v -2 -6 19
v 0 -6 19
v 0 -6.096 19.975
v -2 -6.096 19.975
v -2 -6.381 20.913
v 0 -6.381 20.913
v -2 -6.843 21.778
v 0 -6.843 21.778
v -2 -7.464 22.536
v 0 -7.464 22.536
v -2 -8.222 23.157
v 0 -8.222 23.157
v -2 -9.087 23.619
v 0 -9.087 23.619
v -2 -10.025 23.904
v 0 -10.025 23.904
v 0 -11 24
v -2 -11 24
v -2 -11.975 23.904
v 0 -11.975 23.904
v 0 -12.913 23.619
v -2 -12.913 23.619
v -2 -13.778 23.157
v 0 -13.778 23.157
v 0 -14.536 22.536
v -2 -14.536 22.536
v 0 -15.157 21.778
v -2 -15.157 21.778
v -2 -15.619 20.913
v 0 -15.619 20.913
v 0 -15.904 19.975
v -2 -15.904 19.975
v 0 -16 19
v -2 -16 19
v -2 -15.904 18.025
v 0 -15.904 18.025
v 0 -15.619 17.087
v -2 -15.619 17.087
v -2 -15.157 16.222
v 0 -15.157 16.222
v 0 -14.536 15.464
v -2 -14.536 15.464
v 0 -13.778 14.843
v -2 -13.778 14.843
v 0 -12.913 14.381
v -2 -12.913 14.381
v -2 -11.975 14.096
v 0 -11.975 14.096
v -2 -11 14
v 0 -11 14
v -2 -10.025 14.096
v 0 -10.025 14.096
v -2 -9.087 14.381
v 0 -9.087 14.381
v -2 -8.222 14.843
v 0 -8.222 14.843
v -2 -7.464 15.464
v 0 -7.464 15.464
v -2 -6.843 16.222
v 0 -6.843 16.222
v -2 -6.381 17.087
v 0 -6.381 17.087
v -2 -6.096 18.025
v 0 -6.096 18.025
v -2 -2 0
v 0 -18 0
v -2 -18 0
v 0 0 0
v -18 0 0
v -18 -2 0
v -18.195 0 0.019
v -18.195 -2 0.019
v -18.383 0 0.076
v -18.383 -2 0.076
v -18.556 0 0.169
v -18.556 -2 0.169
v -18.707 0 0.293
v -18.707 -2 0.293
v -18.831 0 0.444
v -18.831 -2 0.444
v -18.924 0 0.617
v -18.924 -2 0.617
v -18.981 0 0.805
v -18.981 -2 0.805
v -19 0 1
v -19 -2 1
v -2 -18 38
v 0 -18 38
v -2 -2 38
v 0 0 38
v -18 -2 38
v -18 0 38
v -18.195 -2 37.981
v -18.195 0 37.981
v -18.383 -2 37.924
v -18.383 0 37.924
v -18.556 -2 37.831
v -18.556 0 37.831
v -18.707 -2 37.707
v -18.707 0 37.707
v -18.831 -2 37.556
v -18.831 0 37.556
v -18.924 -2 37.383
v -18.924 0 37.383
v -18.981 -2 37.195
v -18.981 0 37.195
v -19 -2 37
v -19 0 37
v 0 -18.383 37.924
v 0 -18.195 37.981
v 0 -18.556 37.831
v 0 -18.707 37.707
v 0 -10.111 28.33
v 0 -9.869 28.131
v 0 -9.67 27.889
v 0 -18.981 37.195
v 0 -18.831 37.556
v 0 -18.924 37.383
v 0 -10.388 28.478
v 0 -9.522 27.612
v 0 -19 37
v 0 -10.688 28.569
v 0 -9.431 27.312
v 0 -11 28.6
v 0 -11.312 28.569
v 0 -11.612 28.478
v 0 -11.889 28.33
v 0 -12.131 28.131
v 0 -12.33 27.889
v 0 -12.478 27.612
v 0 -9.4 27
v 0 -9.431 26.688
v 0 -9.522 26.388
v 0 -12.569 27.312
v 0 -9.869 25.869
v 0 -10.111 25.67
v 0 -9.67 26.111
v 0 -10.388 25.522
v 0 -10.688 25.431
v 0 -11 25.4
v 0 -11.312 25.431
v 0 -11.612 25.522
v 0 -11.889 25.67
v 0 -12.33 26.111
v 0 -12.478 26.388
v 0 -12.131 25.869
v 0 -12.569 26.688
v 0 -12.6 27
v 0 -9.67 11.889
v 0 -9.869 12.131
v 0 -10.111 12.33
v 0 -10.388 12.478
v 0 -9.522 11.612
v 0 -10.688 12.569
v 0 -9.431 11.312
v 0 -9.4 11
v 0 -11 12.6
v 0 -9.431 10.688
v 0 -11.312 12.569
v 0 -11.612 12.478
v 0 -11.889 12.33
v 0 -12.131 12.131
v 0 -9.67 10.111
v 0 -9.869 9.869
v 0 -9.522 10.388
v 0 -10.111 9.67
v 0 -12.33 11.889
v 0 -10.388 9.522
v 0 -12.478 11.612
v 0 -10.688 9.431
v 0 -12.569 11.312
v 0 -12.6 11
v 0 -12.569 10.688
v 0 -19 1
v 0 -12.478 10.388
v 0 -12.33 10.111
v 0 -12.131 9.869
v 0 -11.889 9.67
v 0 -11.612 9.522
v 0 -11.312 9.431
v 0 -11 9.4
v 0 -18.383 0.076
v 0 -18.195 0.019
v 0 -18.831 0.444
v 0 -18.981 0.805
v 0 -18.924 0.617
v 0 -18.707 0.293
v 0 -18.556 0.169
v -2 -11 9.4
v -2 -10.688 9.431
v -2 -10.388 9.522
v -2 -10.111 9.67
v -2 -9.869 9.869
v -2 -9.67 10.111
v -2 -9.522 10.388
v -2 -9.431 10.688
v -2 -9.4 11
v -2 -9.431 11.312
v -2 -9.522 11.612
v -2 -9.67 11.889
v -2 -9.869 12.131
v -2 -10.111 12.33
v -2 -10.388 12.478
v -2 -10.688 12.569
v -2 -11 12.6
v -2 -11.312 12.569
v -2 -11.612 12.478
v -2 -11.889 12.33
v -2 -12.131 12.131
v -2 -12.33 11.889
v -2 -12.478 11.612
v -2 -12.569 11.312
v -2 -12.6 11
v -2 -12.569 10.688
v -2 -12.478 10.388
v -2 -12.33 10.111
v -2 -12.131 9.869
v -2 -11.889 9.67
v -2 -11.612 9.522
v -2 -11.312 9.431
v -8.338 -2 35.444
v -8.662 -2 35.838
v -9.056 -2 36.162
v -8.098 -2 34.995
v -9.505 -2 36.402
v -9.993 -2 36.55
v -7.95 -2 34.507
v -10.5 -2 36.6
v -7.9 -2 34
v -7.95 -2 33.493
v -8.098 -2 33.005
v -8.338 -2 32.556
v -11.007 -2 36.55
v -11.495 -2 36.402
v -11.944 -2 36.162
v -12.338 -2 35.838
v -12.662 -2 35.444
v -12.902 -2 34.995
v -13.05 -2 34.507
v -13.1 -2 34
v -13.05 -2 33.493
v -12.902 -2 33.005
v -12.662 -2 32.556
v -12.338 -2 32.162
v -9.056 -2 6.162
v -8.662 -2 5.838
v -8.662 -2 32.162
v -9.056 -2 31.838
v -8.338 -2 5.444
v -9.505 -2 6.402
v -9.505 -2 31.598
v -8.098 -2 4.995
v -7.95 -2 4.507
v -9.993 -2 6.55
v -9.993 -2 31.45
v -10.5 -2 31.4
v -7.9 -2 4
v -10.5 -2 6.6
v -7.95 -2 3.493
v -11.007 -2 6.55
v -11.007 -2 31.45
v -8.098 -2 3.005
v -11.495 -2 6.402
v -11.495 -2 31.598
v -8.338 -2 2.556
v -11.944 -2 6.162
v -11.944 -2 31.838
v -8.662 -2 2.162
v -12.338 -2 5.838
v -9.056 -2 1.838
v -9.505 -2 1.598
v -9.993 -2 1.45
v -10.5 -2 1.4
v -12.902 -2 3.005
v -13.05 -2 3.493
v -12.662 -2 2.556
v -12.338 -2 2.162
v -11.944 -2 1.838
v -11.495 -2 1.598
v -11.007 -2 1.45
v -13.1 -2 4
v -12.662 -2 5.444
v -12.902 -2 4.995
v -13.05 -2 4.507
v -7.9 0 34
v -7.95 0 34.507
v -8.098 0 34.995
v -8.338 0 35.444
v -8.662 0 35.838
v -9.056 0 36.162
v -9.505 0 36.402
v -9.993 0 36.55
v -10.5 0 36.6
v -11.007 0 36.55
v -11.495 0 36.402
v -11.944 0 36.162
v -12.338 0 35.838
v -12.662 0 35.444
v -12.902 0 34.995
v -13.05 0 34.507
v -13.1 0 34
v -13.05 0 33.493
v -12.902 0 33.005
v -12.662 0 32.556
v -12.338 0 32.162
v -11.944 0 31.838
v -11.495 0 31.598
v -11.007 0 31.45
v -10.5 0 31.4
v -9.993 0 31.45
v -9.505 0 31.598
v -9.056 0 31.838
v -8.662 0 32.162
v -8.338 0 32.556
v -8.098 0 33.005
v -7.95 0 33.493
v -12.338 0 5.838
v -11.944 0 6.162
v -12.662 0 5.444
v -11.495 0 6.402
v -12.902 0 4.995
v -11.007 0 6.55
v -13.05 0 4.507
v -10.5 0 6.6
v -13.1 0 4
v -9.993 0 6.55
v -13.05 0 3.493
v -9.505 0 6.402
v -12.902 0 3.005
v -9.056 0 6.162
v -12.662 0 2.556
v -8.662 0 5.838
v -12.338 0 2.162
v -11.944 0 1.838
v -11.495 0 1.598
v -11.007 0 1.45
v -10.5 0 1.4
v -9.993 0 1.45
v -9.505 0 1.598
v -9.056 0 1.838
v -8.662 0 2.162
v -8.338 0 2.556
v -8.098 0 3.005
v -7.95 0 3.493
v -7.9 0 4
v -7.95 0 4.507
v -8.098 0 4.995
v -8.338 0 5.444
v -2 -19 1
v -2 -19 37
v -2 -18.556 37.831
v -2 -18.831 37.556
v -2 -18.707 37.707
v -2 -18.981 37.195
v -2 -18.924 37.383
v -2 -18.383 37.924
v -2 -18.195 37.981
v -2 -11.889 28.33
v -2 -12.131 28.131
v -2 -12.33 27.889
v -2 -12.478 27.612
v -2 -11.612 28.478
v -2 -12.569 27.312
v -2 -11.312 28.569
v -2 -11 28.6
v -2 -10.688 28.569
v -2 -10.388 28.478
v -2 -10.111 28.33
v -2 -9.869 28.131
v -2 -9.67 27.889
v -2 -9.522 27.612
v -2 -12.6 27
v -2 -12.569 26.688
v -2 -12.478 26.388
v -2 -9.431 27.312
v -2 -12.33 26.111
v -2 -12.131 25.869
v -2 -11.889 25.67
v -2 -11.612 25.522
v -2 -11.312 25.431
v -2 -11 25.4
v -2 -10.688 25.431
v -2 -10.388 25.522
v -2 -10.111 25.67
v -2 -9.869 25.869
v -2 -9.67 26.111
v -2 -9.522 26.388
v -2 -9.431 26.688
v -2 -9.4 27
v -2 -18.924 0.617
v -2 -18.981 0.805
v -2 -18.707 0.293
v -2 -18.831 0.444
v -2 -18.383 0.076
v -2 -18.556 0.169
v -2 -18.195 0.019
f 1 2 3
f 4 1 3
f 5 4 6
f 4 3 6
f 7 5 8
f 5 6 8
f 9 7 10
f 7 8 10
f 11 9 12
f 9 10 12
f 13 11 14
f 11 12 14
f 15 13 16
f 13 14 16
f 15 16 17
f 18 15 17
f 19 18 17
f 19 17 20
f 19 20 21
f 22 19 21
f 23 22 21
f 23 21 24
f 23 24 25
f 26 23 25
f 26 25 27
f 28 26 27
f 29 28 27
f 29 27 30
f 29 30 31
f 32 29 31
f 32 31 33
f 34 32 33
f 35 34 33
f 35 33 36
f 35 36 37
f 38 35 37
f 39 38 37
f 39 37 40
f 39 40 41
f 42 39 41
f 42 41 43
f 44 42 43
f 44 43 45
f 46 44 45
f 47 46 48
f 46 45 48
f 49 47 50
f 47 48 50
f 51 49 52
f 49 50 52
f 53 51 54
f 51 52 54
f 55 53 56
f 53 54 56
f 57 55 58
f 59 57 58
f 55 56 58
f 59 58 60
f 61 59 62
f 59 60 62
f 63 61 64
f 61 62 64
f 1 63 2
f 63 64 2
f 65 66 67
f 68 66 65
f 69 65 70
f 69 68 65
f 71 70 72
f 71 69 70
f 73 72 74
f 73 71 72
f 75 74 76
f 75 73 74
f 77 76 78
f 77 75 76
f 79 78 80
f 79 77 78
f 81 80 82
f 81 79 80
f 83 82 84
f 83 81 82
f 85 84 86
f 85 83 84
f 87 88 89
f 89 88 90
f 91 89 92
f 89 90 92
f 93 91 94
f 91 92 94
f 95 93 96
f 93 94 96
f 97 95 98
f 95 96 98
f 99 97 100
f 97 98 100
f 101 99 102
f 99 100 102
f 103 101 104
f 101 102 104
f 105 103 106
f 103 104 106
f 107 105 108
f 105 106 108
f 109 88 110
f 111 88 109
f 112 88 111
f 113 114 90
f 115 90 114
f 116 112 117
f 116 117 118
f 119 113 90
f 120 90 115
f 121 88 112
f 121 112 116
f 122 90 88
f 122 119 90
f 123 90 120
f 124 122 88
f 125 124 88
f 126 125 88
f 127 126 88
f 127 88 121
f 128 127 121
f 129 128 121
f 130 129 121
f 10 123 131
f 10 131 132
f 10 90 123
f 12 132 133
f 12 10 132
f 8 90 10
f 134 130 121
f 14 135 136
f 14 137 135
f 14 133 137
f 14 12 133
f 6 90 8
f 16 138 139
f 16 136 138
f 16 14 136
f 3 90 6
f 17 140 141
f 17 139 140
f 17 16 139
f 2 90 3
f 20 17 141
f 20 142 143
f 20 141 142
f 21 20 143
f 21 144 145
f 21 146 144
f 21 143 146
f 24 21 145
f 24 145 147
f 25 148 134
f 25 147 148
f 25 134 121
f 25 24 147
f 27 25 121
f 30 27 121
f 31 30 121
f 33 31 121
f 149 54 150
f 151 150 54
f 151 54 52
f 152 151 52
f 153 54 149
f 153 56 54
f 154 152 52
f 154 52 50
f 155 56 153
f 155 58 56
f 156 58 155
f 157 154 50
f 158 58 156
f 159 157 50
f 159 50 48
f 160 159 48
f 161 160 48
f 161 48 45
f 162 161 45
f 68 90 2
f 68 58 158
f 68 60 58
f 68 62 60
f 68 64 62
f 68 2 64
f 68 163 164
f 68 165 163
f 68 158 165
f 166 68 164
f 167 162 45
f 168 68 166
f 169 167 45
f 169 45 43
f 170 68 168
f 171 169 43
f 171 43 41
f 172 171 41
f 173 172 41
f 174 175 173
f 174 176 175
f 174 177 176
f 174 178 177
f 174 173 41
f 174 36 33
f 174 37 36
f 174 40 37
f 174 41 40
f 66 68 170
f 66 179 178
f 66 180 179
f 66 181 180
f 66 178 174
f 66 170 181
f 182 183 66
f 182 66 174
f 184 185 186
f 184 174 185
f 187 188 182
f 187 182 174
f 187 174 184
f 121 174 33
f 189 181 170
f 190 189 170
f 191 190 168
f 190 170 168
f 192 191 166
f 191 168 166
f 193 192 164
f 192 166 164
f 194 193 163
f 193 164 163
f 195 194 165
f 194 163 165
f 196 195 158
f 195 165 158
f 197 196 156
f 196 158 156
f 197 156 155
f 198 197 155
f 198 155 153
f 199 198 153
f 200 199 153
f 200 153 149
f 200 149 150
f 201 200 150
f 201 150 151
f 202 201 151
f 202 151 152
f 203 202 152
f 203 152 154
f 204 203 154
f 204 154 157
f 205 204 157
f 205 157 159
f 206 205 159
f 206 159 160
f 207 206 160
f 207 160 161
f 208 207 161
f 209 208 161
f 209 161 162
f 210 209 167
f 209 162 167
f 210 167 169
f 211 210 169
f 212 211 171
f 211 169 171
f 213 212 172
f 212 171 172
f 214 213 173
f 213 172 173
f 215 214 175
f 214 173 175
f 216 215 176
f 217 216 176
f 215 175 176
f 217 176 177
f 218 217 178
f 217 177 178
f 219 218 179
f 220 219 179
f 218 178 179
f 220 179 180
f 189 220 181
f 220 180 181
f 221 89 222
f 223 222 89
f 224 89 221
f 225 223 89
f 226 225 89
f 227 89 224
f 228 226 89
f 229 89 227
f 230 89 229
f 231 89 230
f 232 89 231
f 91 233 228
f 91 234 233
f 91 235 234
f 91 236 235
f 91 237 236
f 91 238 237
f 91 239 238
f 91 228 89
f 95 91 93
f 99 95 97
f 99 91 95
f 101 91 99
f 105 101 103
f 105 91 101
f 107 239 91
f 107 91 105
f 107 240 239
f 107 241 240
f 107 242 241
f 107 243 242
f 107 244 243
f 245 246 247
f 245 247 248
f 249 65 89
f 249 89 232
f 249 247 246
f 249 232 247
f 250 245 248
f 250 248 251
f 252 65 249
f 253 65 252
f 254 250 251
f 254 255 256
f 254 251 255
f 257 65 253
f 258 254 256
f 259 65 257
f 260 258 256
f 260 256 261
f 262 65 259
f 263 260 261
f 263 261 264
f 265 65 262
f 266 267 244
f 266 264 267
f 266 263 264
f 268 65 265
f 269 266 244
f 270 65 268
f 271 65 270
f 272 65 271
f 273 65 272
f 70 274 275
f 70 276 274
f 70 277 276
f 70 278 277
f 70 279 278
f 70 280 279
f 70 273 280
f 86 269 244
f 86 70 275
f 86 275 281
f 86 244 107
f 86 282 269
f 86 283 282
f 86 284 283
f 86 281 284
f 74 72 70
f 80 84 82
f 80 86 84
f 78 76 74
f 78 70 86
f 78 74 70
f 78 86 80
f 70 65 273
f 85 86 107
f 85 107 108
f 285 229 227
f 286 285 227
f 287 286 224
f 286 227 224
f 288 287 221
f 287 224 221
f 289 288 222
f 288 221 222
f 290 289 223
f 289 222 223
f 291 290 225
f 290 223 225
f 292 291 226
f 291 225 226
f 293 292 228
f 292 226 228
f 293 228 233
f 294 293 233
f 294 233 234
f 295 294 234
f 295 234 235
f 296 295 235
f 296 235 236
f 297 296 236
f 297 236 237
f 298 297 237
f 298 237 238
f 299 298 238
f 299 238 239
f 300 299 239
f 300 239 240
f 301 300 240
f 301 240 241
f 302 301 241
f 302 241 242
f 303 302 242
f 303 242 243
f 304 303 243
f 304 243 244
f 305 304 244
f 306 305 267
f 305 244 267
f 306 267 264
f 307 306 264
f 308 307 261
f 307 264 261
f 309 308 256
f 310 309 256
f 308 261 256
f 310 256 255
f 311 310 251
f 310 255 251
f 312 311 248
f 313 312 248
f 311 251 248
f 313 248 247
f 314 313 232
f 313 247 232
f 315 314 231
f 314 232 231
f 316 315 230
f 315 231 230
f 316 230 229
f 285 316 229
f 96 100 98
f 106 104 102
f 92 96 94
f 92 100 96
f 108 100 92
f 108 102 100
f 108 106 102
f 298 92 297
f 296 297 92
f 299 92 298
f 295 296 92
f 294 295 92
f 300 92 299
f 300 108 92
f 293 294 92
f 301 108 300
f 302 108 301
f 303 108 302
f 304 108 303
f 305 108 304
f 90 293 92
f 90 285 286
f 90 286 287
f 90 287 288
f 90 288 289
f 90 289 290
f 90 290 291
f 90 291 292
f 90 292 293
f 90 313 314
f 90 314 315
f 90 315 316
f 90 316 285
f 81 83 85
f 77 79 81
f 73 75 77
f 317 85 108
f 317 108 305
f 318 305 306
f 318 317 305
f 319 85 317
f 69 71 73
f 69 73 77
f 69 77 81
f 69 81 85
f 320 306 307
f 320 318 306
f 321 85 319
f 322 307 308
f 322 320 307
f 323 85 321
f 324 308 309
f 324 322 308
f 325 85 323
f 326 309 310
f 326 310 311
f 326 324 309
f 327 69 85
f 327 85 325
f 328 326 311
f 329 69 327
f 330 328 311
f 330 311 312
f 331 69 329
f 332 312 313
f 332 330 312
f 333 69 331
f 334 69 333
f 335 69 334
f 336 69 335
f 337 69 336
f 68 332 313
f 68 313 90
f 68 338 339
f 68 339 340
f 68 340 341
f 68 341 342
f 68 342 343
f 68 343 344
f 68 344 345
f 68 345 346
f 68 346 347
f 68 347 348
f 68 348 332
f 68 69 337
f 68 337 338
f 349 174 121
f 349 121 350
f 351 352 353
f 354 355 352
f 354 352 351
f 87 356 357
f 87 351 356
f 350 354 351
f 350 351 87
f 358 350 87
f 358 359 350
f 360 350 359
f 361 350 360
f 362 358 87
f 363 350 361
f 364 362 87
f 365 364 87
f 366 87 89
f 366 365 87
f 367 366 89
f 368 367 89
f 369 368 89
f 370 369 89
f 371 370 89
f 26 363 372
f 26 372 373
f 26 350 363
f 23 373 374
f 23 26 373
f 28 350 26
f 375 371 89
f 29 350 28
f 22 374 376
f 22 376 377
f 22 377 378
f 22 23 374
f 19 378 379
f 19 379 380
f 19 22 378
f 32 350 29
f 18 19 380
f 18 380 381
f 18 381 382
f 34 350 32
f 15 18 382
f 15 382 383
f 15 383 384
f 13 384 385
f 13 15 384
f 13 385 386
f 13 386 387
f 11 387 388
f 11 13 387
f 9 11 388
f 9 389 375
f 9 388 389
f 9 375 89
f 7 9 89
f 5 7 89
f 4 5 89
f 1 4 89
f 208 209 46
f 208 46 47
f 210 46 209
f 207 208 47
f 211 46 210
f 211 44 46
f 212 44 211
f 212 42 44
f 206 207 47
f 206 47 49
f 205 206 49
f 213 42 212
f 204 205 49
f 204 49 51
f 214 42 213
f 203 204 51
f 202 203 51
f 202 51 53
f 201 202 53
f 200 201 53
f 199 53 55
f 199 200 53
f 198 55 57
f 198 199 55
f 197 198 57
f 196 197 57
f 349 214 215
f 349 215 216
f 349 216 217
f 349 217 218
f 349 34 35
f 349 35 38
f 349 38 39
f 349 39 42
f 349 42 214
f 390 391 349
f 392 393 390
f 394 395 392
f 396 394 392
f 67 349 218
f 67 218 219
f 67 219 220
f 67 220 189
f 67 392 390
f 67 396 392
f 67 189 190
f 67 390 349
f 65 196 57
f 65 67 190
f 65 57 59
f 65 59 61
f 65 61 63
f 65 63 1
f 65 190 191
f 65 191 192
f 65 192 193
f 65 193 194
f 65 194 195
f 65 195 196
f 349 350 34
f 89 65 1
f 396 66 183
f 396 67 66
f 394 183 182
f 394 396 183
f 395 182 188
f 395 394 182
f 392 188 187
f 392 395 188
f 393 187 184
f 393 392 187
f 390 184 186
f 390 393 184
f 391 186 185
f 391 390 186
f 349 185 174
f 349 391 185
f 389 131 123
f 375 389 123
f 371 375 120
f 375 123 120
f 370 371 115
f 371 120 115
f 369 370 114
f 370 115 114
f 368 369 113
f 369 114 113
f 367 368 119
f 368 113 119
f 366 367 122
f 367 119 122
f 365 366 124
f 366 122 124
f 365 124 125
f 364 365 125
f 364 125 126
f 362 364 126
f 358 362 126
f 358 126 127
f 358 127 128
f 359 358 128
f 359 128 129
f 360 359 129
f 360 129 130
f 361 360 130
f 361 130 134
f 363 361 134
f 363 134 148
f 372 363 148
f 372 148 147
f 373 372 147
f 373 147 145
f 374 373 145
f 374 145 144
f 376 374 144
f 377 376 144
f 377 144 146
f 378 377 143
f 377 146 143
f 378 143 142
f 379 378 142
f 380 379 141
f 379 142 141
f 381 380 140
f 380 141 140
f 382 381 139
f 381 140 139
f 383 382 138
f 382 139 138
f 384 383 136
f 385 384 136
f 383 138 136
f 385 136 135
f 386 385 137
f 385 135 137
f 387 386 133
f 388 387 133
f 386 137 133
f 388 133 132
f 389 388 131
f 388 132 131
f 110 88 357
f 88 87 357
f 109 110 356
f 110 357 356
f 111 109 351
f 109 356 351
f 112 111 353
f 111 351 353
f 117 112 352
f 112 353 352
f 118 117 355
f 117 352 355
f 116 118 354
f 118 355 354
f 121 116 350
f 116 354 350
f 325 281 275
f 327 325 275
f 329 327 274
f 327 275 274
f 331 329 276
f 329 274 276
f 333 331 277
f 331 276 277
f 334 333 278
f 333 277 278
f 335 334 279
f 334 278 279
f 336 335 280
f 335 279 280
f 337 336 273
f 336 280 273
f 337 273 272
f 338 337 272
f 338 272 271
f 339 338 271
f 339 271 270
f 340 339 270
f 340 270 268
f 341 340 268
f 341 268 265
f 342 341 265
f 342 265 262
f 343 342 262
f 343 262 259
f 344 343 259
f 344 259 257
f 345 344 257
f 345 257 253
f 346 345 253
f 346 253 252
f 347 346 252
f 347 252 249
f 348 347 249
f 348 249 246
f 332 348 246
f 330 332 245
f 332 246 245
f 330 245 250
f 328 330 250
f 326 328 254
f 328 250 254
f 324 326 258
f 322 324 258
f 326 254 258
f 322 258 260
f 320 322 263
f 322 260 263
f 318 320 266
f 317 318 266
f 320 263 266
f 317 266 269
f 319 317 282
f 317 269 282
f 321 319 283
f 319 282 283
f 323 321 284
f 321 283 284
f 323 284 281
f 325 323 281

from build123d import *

# Parameters (mm, degrees)
BOSS_EXTRUDE1_DEPTH = 38
SKETCH2_R           = 5
SKETCH2_R_2         = 1.6
CUT_EXTRUDE1_DEPTH  = 47.540305113
SKETCH3_R           = 2.6
CUT_EXTRUDE2_DEPTH  = 46.760244755
FILLET1_R           = 1


with BuildPart() as part:
    # Sketch1 → Boss-Extrude1 (new body)
    with BuildSketch(Plane.XY):
        Polygon((0, 0), (0, -19), (-2, -19), (-2, -2), (-19, -2), (-19, 0), align=None)
    extrude(amount=BOSS_EXTRUDE1_DEPTH)

    # Sketch2 → Cut-Extrude1 (cut, through all)
    with BuildSketch(Plane(origin=(0, 0, 0), x_dir=(0, 0, -1), z_dir=(1, 0, 0))):
        with Locations(Location((-19, -11, 0), (0, 0, 90))):
            Circle(SKETCH2_R)
        with Locations(Location((-27, -11, 0), (0, 0, 90))):
            Circle(SKETCH2_R_2)
        with Locations((-11, -11)):
            Circle(SKETCH2_R_2)
    extrude(amount=-CUT_EXTRUDE1_DEPTH, mode=Mode.SUBTRACT)

    # Sketch3 → Cut-Extrude2 (cut, through all)
    with BuildSketch(Plane.XZ.offset(2)):
        with Locations((-10.5, 34)):
            Circle(SKETCH3_R)
        with Locations(Location((-10.5, 4, 0), (0, 0, 180))):
            Circle(SKETCH3_R)
    extrude(amount=-CUT_EXTRUDE2_DEPTH, mode=Mode.SUBTRACT)

    # Fillet1
    fillet1_edges = [part.edges().sort_by_distance(p)[0] for p in [
        (-1, -19, 38),
        (-1, -19, 0),
        (-19, -1, 38),
        (-19, -1, 0),
    ]]
    fillet(fillet1_edges, radius=FILLET1_R)


solid = part.part
